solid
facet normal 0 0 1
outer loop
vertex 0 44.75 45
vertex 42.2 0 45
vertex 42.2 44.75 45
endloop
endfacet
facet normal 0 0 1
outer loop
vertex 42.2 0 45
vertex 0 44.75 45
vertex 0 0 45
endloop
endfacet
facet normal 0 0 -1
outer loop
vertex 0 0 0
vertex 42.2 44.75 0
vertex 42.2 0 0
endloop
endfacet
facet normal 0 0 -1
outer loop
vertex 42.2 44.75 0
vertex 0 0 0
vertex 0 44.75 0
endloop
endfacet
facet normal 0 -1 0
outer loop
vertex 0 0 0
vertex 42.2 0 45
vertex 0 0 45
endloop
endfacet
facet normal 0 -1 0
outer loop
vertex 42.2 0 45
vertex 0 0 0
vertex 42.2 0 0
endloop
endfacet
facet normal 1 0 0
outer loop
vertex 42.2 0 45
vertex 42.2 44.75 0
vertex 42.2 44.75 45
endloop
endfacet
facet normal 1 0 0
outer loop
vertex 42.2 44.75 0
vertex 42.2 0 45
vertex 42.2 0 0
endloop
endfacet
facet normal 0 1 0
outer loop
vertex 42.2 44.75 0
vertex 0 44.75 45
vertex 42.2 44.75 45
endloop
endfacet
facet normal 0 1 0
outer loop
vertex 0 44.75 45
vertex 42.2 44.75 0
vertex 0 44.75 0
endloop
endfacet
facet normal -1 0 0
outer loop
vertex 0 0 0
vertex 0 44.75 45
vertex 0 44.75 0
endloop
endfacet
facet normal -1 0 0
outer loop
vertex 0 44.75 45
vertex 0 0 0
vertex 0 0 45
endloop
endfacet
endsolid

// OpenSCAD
// This is a replication of a Prism that was graciously gifted to me at my local ax-man hardware paradise.
//**Thanks Ricky you are the man!

//All measurements are in millimeters and are accurate to + or - 2 mm.
//This specific prism is missing some very important features.
//There are a couple missing chunks on the side that are not represented in the current model. 
module prism() {
  cube([42.2,44.75,45]);
}

// This is just a call to render the object.

prism();
